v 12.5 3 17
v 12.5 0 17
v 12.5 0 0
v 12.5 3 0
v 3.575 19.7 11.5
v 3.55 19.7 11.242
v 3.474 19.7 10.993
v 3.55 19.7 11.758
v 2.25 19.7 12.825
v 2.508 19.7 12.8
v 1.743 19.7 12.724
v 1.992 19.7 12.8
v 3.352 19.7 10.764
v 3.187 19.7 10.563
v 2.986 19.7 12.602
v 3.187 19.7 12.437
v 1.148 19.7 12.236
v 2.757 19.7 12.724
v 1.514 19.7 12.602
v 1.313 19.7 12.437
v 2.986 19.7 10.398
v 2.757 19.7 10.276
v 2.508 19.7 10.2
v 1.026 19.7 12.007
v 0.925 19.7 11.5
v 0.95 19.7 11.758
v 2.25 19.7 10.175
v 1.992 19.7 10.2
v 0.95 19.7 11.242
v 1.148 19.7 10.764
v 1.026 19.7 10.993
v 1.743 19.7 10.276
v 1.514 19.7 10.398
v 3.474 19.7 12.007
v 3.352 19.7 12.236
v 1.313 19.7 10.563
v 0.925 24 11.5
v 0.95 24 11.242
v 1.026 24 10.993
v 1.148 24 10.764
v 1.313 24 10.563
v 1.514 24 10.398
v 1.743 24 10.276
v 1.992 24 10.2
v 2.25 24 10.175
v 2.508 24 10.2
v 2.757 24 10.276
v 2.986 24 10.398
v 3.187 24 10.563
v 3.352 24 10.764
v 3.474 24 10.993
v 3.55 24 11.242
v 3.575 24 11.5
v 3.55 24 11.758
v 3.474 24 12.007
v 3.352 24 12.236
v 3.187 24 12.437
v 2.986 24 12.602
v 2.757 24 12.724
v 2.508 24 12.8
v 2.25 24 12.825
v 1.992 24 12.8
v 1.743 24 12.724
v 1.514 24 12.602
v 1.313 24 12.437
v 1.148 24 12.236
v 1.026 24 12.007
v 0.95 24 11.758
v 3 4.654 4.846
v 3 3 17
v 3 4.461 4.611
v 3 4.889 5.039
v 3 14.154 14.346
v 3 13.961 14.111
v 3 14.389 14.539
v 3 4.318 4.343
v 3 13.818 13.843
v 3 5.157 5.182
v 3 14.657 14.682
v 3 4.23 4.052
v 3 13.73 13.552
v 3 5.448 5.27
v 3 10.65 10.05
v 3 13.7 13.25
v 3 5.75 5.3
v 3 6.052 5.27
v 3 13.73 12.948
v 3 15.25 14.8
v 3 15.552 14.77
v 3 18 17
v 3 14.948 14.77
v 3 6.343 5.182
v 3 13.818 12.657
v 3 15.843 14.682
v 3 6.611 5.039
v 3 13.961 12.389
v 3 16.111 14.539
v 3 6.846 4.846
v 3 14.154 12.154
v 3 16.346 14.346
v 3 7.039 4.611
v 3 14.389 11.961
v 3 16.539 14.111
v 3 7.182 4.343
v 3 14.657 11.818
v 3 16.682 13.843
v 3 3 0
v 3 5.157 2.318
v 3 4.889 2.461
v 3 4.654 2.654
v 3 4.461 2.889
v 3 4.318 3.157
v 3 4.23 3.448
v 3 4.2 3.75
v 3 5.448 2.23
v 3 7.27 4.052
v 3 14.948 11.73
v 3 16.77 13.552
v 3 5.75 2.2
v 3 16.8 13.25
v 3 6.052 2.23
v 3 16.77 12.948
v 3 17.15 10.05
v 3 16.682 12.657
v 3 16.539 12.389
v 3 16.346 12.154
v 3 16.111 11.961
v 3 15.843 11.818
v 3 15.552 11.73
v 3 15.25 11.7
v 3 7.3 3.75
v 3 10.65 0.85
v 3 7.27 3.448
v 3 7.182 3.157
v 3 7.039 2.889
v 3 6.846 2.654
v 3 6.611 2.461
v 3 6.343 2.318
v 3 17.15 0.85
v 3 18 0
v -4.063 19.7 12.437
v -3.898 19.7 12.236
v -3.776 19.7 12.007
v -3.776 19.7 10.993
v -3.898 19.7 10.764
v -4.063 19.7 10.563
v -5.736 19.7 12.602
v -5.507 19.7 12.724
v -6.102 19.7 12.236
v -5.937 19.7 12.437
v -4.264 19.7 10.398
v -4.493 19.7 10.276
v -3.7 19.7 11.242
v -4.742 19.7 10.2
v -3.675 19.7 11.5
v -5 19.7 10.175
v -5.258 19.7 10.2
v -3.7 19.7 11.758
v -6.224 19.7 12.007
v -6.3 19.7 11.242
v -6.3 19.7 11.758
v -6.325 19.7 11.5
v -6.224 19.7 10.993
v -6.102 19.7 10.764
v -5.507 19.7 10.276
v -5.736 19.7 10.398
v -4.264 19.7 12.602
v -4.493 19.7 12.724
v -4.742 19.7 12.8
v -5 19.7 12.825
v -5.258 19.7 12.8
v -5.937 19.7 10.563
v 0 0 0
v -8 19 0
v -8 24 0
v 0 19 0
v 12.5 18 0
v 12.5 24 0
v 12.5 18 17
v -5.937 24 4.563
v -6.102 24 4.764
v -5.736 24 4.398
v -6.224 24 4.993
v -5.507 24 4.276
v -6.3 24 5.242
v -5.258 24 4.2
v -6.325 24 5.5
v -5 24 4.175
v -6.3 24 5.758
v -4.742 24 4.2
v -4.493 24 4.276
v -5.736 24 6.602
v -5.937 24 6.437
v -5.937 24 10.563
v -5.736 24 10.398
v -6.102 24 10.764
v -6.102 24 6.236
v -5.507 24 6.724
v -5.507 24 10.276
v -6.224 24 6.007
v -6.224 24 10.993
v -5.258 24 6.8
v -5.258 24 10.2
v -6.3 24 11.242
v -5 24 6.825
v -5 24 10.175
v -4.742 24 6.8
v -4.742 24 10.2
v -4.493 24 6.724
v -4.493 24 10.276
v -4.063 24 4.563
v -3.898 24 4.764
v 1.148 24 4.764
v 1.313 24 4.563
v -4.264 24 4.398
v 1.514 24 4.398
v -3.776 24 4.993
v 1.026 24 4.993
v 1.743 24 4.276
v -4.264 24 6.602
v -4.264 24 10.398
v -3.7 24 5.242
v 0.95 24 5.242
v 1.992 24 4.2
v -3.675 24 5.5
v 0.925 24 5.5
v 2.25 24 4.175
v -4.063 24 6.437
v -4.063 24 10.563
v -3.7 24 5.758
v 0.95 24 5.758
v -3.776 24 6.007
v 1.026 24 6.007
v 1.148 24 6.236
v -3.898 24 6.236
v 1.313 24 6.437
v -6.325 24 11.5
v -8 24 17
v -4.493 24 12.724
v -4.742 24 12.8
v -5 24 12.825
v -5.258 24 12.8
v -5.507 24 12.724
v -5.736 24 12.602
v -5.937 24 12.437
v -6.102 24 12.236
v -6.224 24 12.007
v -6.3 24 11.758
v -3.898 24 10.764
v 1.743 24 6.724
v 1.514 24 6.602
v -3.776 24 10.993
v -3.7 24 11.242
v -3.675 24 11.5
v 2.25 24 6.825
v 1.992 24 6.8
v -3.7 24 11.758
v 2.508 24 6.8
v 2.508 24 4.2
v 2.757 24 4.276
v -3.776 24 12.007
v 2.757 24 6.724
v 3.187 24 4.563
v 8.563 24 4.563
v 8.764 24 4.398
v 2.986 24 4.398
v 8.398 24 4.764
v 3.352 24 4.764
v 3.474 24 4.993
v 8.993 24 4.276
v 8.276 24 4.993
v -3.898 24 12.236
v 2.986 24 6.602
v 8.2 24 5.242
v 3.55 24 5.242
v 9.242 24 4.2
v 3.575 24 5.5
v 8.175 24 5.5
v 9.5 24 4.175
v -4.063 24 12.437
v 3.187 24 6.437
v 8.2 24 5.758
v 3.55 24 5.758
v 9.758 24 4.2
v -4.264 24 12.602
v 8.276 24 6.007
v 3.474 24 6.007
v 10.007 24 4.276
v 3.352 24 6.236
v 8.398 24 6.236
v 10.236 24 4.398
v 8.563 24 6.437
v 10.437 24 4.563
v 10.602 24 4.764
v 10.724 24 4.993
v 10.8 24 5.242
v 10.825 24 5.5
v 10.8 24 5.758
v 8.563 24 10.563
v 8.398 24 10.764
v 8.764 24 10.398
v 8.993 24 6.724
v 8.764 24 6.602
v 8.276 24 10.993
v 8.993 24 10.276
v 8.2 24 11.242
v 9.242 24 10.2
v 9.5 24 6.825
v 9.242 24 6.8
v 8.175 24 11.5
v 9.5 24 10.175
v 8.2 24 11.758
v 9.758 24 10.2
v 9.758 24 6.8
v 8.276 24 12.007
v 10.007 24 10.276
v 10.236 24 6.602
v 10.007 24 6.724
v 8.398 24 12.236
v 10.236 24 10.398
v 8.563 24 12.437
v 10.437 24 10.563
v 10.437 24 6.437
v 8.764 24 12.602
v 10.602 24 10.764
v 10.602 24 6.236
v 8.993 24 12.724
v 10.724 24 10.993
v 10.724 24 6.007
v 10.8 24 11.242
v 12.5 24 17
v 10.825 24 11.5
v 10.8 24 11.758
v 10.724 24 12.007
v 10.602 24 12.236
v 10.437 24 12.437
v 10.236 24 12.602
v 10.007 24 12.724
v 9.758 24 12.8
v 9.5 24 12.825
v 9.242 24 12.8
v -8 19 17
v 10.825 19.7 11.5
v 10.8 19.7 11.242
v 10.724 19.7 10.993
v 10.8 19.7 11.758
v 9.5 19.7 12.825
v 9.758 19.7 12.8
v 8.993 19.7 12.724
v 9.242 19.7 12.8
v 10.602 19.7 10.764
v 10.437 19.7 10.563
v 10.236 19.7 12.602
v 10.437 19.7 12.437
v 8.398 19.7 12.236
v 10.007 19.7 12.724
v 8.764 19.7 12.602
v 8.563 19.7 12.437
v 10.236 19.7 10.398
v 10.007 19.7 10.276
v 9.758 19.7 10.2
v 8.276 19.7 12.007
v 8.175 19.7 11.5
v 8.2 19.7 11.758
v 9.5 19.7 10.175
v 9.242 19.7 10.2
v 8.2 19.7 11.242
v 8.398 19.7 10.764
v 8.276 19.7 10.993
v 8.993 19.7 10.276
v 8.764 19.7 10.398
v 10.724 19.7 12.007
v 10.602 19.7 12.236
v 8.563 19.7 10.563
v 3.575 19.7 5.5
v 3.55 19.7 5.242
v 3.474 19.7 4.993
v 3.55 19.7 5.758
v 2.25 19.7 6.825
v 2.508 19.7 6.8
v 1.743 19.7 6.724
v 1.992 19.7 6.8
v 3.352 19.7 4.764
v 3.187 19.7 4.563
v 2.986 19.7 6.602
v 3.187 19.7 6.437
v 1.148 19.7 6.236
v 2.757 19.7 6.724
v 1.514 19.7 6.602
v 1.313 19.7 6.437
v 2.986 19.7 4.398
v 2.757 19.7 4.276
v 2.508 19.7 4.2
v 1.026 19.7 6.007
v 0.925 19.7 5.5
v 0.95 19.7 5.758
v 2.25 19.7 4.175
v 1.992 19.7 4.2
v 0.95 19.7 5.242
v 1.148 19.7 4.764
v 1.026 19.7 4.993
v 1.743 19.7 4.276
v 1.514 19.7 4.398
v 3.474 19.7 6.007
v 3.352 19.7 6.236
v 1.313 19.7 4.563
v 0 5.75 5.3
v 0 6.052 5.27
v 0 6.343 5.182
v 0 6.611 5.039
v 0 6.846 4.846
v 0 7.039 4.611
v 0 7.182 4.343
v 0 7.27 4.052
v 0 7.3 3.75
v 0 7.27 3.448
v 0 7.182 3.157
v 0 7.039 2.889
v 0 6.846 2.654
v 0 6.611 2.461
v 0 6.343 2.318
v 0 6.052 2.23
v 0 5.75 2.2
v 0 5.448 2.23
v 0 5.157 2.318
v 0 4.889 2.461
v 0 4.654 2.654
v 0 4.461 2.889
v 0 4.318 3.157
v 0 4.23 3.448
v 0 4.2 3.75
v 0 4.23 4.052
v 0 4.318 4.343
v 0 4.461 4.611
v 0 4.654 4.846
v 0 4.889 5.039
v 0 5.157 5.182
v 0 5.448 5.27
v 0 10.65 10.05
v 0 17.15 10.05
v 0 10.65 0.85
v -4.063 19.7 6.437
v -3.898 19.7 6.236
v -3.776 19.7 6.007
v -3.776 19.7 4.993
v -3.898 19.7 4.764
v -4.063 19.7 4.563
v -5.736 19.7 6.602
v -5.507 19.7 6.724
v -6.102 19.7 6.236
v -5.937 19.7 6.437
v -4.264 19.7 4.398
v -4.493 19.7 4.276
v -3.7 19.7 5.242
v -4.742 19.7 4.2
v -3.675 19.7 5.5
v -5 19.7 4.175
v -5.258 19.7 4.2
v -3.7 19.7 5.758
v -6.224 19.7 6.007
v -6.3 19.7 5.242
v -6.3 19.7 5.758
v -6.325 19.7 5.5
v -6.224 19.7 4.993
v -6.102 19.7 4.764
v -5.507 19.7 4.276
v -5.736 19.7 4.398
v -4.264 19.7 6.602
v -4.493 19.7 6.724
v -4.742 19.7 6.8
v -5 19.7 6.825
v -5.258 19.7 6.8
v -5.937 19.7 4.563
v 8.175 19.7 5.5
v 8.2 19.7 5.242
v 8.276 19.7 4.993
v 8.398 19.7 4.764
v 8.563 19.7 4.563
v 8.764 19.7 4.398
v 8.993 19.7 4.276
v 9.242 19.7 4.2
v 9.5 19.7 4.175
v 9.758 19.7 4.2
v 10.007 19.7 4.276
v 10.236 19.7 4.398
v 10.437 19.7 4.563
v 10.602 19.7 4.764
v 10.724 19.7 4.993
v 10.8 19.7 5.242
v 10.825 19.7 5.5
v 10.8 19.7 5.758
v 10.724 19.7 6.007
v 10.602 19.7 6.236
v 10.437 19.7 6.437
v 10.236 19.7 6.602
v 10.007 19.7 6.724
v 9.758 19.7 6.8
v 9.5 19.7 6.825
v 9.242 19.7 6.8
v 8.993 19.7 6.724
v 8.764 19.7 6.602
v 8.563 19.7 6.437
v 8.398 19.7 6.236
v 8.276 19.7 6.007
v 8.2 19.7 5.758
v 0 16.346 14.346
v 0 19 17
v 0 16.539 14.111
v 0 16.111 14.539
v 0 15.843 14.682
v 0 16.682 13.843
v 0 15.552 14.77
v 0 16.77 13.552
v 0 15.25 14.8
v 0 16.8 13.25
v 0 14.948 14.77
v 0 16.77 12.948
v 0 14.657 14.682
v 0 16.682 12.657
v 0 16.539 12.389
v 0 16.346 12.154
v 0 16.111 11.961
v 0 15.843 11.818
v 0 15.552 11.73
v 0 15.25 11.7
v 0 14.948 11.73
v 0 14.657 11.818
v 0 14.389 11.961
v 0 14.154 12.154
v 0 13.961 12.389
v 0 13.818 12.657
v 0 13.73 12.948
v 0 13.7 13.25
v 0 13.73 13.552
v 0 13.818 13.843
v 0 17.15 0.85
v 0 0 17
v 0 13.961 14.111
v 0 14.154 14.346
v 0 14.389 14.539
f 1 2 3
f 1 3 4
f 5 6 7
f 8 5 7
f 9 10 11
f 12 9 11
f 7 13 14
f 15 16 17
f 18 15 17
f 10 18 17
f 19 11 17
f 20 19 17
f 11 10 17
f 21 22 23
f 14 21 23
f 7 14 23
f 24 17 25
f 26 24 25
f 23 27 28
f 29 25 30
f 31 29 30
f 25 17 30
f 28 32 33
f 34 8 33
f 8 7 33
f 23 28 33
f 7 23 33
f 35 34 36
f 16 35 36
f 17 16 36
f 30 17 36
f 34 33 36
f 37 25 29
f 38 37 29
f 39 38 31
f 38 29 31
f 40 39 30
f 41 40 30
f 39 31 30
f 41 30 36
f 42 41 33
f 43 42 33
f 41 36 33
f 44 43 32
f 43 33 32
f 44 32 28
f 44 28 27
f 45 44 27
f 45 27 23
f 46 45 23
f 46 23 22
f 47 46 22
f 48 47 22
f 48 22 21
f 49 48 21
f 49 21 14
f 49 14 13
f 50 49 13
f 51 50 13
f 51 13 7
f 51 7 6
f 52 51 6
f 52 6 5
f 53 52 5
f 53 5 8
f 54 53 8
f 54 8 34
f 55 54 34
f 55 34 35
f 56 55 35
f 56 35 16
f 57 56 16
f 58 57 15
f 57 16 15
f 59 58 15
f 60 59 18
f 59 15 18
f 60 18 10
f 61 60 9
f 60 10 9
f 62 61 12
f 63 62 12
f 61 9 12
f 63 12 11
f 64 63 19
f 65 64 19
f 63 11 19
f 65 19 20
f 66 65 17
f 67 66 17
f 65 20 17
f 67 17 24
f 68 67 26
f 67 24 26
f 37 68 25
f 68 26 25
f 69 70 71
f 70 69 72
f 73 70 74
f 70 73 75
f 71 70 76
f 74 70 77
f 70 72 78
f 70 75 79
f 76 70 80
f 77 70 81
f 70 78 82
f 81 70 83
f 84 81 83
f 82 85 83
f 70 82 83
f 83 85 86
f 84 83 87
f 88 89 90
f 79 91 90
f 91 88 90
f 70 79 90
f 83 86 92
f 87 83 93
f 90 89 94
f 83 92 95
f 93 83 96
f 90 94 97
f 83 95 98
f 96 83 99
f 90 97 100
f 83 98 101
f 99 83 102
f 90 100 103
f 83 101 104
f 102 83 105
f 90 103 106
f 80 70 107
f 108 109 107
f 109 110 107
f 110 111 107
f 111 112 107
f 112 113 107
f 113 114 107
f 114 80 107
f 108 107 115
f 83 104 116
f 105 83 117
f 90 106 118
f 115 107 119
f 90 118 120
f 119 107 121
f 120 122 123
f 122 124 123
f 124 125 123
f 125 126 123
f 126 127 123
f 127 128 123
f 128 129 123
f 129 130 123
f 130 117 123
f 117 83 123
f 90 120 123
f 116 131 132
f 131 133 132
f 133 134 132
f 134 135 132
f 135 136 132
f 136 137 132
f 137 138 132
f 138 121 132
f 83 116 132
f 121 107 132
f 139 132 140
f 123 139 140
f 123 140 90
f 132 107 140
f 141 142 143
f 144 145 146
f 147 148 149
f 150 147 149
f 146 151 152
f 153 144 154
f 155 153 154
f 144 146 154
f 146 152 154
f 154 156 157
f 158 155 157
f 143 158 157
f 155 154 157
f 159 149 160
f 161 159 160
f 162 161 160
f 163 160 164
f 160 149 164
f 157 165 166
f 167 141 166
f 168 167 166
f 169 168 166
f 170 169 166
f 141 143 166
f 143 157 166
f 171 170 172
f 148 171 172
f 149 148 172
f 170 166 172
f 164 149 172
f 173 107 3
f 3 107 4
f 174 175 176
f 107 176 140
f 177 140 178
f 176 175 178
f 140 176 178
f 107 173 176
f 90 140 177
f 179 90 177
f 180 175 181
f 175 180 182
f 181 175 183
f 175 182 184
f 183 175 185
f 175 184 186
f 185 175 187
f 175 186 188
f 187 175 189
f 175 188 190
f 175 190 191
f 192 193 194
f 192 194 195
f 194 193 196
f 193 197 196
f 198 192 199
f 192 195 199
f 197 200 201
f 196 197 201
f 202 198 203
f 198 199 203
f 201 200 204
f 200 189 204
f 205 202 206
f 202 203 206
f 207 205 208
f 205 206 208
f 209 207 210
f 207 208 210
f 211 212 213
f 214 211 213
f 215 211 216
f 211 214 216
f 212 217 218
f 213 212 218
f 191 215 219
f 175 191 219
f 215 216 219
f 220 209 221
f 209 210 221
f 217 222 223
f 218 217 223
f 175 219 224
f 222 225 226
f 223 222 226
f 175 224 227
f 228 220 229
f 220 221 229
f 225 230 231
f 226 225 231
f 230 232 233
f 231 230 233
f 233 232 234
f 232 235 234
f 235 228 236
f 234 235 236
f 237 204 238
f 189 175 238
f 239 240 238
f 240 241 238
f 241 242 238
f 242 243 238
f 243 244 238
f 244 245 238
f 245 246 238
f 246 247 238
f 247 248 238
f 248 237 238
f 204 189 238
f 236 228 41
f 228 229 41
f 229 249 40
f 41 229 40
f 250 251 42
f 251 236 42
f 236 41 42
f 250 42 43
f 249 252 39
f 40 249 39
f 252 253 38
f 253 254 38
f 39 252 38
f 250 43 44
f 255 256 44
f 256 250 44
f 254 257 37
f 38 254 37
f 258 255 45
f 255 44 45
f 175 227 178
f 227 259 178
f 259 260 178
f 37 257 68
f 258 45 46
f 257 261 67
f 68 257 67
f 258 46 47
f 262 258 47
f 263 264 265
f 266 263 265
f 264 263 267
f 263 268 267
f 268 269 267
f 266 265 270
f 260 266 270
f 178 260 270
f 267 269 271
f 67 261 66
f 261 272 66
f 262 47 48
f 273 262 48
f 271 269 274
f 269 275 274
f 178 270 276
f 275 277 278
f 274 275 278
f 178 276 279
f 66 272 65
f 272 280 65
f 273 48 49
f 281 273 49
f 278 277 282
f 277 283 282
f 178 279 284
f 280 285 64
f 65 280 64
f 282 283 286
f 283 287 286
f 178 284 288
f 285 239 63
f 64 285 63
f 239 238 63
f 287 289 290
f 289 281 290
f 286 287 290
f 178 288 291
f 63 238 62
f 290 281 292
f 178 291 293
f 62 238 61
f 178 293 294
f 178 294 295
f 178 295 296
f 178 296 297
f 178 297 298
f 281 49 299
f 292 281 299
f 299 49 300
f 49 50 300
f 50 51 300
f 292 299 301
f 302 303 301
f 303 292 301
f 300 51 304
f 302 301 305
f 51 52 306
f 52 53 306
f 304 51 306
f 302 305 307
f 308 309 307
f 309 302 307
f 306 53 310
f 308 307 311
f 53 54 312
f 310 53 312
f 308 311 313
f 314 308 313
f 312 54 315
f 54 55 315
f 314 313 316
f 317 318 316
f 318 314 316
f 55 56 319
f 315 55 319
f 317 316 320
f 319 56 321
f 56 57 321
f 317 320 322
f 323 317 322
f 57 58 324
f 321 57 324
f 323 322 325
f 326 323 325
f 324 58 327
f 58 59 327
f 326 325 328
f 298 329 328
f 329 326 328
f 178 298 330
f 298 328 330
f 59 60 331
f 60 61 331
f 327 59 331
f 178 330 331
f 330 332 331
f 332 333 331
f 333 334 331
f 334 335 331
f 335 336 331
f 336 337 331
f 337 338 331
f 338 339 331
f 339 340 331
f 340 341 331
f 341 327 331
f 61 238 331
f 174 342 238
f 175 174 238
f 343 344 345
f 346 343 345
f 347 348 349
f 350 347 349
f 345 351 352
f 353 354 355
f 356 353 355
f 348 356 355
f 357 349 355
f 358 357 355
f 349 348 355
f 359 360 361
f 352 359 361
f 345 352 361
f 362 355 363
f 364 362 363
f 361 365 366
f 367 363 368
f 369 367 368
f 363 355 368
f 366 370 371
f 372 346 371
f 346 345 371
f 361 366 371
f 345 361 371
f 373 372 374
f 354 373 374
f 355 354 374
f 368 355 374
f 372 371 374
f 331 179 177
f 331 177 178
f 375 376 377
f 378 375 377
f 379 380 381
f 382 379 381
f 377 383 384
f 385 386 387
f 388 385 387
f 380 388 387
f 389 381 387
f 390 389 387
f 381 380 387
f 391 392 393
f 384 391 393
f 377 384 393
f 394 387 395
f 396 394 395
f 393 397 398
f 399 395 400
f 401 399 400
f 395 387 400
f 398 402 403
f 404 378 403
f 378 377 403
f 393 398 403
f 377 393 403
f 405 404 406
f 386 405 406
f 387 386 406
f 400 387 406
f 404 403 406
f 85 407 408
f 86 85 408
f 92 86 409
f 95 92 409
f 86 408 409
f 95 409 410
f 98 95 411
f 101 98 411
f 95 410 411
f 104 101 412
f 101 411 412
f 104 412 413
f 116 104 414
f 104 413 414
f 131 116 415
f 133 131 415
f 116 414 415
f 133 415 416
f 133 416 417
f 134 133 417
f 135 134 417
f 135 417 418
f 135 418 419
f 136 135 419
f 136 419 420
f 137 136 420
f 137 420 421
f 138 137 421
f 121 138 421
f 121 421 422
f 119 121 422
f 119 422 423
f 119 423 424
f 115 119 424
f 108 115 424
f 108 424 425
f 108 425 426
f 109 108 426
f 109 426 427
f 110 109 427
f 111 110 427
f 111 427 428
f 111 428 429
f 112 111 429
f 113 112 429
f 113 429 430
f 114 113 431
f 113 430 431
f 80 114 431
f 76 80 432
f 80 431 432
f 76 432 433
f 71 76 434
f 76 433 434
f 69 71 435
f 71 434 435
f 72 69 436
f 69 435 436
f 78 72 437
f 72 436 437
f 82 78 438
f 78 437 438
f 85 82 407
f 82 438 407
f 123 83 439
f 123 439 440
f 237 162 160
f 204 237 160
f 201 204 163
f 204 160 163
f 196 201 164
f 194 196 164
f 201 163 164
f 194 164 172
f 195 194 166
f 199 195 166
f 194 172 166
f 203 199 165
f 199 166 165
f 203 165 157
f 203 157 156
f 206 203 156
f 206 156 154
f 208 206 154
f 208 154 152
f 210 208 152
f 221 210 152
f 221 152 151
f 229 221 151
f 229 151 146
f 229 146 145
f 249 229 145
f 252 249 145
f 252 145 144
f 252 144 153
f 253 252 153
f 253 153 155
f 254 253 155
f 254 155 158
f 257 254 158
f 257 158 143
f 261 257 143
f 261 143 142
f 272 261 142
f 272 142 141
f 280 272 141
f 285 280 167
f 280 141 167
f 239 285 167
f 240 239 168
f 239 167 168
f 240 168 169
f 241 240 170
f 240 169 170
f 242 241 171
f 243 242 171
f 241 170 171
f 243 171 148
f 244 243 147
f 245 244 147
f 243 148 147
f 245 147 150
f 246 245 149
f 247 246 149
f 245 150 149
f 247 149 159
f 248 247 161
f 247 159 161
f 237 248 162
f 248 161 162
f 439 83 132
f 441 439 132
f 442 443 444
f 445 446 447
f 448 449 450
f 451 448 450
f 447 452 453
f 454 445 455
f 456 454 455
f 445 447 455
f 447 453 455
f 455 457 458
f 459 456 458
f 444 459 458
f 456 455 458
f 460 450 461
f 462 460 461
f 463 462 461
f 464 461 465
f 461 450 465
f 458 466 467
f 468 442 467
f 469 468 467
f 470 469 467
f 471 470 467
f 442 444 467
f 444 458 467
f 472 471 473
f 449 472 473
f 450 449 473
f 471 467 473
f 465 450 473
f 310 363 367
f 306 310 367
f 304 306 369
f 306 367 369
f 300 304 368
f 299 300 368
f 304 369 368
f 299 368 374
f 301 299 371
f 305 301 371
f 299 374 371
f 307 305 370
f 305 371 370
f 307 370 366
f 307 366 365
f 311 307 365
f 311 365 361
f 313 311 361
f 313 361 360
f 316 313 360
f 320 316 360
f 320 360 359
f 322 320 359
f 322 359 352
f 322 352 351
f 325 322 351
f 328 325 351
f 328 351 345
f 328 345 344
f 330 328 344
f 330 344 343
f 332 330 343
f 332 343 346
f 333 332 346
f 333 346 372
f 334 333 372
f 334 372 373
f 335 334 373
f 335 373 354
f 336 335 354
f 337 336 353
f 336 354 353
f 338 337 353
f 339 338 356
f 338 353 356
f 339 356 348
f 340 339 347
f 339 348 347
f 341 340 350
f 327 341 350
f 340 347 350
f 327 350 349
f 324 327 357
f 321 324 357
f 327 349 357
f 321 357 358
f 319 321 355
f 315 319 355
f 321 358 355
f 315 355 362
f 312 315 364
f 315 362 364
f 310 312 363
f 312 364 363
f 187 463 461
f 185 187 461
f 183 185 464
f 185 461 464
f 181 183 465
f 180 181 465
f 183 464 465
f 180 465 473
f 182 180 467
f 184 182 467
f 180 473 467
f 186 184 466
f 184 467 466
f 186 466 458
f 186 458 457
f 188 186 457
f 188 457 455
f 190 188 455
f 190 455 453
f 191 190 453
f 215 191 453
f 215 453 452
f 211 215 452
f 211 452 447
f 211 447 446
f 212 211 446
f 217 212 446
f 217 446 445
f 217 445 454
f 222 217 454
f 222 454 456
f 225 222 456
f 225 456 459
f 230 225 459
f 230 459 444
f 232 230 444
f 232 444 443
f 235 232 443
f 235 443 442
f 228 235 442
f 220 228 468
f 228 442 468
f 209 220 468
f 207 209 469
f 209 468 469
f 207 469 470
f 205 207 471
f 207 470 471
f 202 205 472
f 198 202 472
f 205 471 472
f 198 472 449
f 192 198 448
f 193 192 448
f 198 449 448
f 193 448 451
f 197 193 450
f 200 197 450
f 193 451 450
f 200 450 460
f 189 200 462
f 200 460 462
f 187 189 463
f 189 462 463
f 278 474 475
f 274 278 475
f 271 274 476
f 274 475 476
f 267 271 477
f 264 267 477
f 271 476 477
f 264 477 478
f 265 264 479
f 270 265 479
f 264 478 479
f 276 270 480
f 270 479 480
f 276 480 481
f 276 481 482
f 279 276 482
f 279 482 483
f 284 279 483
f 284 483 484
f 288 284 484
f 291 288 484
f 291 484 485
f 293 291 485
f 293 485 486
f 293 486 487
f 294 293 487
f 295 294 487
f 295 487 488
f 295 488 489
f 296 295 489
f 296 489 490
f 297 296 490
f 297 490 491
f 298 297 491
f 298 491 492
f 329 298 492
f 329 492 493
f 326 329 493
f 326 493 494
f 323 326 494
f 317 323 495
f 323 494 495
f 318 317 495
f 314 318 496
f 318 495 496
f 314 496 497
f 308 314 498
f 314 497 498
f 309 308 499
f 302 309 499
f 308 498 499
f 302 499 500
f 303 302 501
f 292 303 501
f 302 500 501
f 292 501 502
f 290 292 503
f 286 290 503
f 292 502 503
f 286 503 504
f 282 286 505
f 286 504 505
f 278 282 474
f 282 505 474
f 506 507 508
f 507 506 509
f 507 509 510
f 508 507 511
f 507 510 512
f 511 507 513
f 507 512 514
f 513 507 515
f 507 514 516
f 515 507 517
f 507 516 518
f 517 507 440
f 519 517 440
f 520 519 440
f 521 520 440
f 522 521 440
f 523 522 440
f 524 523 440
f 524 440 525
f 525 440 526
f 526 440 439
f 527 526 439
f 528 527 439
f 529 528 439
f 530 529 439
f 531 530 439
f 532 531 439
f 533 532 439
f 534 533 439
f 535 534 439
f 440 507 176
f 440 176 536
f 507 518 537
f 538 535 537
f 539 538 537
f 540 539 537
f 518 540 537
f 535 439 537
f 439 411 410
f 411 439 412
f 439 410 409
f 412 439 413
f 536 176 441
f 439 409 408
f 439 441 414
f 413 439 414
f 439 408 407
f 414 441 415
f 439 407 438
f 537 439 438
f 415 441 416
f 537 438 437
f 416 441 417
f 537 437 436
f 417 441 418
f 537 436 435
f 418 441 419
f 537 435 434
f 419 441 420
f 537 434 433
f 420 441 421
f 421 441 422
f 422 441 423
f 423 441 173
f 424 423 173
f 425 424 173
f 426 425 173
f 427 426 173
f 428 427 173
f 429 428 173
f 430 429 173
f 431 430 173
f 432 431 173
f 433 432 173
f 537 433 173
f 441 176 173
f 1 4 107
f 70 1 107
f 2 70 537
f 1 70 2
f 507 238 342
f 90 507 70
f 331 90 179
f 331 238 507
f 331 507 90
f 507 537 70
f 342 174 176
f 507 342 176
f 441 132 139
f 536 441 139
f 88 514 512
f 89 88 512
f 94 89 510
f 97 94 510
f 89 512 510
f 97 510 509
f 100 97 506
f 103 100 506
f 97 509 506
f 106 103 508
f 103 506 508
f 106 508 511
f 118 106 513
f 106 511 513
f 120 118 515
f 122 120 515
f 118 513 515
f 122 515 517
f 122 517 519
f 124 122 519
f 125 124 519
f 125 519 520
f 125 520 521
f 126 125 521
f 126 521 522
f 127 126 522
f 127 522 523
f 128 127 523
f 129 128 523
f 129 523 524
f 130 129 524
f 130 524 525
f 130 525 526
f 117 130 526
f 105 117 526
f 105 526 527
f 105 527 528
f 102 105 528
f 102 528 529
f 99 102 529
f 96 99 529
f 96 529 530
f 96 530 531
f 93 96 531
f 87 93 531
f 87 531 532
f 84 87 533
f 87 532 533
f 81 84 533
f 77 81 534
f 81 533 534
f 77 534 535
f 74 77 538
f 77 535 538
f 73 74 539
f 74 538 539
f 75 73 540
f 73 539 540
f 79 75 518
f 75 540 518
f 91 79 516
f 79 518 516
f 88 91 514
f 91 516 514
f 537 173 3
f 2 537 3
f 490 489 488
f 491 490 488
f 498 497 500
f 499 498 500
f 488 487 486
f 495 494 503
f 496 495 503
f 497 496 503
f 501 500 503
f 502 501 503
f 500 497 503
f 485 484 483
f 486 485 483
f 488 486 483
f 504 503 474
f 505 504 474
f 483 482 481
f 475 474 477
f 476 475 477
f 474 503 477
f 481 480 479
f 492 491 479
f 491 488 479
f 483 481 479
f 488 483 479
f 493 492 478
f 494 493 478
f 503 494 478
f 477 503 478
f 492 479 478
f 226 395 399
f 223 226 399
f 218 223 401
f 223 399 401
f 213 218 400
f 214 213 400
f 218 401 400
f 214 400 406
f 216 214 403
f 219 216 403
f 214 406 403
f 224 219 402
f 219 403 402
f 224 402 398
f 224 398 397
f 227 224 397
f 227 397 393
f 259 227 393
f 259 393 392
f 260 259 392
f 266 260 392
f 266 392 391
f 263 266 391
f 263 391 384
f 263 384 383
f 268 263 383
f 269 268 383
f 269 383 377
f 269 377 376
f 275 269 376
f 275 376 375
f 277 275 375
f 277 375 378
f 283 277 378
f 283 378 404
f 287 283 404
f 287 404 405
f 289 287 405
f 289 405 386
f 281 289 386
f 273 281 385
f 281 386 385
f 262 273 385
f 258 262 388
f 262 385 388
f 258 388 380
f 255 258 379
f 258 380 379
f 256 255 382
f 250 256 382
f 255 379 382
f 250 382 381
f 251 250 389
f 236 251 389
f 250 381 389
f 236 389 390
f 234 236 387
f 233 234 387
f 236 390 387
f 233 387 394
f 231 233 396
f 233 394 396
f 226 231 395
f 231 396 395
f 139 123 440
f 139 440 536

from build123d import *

# Parameters (mm, degrees)
BOSS_EXTRUDE1_DEPTH           = 17
F_3_0_3_DIAMETER_HOLE1_D      = 3.1
TAP_DRILL_FOR_M2_5_TAP1_D     = 2.65
TAP_DRILL_FOR_M2_5_TAP1_DEPTH = 4.3
SKETCH8_W                     = 9.2
SKETCH8_H                     = 6.5
CUT_EXTRUDE1_DEPTH            = 10
SKETCH9_W                     = 8
SKETCH9_H                     = 6
BOSS_EXTRUDE2_DEPTH           = 17
TAP_DRILL_FOR_M2_5_TAP2_D     = 2.65
TAP_DRILL_FOR_M2_5_TAP2_DEPTH = 4.3
SKETCH12_W                    = 8
SKETCH12_H                    = 1
CUT_EXTRUDE2_DEPTH            = 26


with BuildPart() as part:
    # Sketch1 → Boss-Extrude1 (new body)
    with BuildSketch(Plane.XY):
        Polygon((0, 2.988929889), (0, 0), (5, 0), (12.5, 0), (12.5, 3), (3, 3), (3, 18), (12.5, 18), (12.5, 24), (5, 24), (0, 24), (0, 17.988929889), align=None)
    extrude(amount=BOSS_EXTRUDE1_DEPTH)

    # Ø3.0 (3) Diameter Hole1 (through all)
    with Locations(Plane(origin=(3, 0, 0), x_dir=(0, 0, -1), z_dir=(1, 0, 0))):
        with Locations((-13.25, 15.25), (-3.75, 5.75)):
            Hole(F_3_0_3_DIAMETER_HOLE1_D / 2)

    # Tap Drill for M2.5 Tap1
    with Locations(Plane(origin=(0, 24, 0), x_dir=(1, 0, 0), z_dir=(0, 1, 0))):
        with Locations((2.25, -5.5), (2.25, -11.5), (9.5, -11.5), (9.5, -5.5)):
            Hole(TAP_DRILL_FOR_M2_5_TAP1_D / 2, depth=TAP_DRILL_FOR_M2_5_TAP1_DEPTH)

    # Sketch8 → Cut-Extrude1 (cut)
    with BuildSketch(Plane(origin=(3, 0, 0), x_dir=(0, 0, -1), z_dir=(1, 0, 0))):
        with Locations((-5.45, 13.9)):
            Rectangle(SKETCH8_W, SKETCH8_H)
    extrude(amount=-CUT_EXTRUDE1_DEPTH, mode=Mode.SUBTRACT)

    # Sketch9 → Boss-Extrude2 (add)
    with BuildSketch(Plane.XY.offset(17)):
        with Locations((-4, 21)):
            Rectangle(SKETCH9_W, SKETCH9_H)
    extrude(amount=-BOSS_EXTRUDE2_DEPTH)

    # Tap Drill for M2.5 Tap2
    with Locations(Plane(origin=(0, 24, 0), x_dir=(1, 0, 0), z_dir=(0, 1, 0))):
        with Locations((-5, -11.5), (-5, -5.5)):
            Hole(TAP_DRILL_FOR_M2_5_TAP2_D / 2, depth=TAP_DRILL_FOR_M2_5_TAP2_DEPTH)

    # Sketch12 → Cut-Extrude2 (cut)
    with BuildSketch(Plane.XY.offset(17)):
        with Locations((-4, 18.5)):
            Rectangle(SKETCH12_W, SKETCH12_H)
    extrude(amount=-CUT_EXTRUDE2_DEPTH, mode=Mode.SUBTRACT)


solid = part.part
